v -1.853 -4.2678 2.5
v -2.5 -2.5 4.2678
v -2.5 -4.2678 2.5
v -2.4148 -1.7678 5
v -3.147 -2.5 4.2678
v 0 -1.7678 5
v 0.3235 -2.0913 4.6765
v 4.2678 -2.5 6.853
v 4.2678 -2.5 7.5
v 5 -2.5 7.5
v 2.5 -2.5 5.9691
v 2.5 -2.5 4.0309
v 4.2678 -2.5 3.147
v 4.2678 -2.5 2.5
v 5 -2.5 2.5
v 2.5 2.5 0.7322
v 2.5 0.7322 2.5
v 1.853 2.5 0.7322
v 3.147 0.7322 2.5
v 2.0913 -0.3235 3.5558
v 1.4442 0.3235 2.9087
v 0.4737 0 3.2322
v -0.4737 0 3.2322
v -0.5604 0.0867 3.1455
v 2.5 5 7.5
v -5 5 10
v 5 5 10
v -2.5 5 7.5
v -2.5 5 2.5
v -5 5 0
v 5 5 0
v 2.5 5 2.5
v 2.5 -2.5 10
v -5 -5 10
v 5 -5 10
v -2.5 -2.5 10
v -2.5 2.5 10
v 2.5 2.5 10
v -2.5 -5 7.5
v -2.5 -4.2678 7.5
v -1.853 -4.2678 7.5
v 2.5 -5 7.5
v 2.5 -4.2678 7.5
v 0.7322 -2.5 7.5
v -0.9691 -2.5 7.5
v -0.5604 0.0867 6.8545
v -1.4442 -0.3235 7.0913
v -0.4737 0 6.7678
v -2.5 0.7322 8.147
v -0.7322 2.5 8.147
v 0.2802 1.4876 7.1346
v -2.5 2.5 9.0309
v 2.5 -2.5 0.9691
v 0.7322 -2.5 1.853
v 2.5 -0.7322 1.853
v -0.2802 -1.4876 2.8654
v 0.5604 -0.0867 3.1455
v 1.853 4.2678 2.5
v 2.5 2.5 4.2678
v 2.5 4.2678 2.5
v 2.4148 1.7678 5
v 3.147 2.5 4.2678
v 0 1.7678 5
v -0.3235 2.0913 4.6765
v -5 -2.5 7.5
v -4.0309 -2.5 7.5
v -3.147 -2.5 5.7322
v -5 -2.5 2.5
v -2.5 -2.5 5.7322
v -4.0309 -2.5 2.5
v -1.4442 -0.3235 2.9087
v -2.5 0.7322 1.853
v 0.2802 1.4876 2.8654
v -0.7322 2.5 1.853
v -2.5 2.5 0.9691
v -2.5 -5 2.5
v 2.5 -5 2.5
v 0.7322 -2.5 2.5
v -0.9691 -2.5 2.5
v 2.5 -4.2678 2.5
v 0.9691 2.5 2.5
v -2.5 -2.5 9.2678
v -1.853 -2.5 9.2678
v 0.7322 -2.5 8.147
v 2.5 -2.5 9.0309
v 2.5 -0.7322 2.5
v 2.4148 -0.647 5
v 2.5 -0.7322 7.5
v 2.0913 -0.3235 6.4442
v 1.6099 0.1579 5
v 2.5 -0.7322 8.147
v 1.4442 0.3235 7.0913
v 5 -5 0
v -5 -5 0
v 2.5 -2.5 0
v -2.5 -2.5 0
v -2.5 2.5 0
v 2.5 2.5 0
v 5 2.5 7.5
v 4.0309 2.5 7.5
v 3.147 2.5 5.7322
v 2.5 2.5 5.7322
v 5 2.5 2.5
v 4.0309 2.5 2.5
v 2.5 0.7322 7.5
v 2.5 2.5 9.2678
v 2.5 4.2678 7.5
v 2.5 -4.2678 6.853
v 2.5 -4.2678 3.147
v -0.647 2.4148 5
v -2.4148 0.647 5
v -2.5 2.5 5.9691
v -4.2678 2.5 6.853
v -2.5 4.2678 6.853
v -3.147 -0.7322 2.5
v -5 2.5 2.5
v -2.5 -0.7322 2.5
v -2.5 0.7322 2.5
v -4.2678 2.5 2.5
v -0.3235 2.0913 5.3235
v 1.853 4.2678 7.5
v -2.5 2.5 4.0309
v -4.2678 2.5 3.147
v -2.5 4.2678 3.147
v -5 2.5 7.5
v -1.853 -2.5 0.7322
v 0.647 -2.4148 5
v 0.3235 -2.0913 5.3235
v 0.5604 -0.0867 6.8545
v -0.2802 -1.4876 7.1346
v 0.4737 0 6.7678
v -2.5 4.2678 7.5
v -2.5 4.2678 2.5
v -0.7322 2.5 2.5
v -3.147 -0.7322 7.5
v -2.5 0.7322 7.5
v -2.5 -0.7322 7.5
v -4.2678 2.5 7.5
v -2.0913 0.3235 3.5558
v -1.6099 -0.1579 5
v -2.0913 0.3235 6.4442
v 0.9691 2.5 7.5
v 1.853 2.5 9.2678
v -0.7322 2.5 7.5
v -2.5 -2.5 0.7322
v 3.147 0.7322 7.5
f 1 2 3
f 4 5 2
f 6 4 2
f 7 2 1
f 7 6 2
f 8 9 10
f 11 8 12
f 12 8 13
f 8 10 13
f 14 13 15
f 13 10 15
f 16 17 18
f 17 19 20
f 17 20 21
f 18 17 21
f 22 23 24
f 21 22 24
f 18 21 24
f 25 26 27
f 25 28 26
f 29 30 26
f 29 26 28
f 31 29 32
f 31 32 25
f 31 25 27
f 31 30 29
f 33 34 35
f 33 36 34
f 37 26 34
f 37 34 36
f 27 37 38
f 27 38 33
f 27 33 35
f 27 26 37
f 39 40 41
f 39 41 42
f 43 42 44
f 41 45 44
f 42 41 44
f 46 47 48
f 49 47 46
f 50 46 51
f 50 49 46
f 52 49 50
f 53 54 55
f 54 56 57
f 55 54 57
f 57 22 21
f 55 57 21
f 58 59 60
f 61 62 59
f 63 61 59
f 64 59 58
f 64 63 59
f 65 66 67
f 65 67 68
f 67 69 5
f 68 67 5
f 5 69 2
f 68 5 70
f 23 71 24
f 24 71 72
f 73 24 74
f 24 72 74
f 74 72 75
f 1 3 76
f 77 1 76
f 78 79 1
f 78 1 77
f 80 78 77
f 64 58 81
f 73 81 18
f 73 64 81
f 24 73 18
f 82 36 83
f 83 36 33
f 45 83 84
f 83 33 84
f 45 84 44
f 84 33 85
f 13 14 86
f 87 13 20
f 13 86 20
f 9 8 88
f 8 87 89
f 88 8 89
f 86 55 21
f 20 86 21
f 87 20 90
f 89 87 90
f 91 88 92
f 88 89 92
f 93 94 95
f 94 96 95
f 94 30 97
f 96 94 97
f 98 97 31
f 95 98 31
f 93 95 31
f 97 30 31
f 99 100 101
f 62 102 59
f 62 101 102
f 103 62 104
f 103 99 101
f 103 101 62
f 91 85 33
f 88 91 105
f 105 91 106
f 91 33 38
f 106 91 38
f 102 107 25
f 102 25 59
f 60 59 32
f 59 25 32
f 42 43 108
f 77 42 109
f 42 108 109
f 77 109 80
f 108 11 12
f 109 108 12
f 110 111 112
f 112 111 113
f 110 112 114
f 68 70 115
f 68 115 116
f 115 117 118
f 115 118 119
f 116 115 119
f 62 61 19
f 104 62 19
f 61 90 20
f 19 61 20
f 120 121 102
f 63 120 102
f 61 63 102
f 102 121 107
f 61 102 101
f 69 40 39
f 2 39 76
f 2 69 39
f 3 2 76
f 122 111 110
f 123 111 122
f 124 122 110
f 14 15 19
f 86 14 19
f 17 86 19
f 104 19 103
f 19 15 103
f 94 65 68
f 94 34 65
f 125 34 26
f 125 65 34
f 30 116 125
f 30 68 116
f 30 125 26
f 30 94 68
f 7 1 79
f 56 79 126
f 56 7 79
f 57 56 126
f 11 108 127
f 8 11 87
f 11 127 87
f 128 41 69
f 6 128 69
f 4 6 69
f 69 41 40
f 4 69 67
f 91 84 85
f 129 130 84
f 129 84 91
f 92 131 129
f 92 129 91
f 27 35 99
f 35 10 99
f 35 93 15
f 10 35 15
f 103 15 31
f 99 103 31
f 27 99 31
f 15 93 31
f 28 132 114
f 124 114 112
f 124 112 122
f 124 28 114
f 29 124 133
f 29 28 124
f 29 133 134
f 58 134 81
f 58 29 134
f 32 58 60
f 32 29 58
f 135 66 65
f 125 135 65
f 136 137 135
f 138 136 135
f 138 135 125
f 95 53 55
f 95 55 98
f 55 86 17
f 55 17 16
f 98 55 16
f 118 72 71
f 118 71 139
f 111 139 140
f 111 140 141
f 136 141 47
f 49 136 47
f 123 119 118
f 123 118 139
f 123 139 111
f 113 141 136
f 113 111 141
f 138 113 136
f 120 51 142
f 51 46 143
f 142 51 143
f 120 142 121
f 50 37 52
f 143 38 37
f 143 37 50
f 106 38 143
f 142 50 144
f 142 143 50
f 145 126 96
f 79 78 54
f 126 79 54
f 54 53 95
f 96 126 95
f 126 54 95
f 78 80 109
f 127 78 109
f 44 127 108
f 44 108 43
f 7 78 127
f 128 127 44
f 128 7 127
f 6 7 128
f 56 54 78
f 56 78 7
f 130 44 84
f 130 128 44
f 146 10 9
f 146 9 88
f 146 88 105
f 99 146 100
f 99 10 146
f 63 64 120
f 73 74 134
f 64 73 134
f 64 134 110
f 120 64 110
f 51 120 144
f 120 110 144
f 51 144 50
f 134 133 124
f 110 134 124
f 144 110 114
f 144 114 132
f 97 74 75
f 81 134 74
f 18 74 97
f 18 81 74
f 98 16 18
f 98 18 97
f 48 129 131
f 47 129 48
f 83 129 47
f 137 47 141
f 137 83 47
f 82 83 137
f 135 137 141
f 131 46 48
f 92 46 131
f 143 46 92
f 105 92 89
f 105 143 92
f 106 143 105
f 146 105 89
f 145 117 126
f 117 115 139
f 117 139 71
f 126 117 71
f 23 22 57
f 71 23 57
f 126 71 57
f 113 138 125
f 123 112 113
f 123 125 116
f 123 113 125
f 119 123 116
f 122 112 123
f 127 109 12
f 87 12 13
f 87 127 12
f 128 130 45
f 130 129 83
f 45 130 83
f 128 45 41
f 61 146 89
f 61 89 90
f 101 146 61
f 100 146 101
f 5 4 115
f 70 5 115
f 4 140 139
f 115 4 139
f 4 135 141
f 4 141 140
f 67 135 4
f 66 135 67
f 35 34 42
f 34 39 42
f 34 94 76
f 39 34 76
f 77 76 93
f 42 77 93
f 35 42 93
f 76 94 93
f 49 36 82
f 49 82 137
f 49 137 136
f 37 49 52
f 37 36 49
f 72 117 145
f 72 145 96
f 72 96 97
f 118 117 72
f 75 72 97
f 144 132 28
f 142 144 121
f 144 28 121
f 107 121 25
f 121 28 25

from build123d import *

# Parameters (mm, degrees)
SKETCH1_W           = 10
SKETCH1_H           = 10
BOSS_EXTRUDE1_DEPTH = 10
SKETCH2_W           = 5
SKETCH2_H           = 5
CUT_EXTRUDE1_DEPTH  = 13
SKETCH3_W           = 5
SKETCH3_H           = 5
CUT_EXTRUDE2_DEPTH  = 13
SKETCH4_W           = 5
SKETCH4_H           = 5
CUT_EXTRUDE3_DEPTH  = 13
SKETCH5_W           = 2.5
SKETCH5_H           = 2.5
BOSS_EXTRUDE3_DEPTH = 12
SKETCH7_W           = 2.5
SKETCH7_H           = 2.5
BOSS_EXTRUDE4_DEPTH = 12
SKETCH9_W           = 2.5
SKETCH9_H           = 2.5
BOSS_EXTRUDE5_DEPTH = 12
SKETCH11_W          = 2.5
SKETCH11_H          = 2.5
BOSS_EXTRUDE6_DEPTH = 12


with BuildPart() as part:
    # Sketch1 → Boss-Extrude1 (new body)
    with BuildSketch(Plane.XY):
        Rectangle(SKETCH1_W, SKETCH1_H)
    extrude(amount=BOSS_EXTRUDE1_DEPTH)

    # Sketch2 → Cut-Extrude1 (cut)
    with BuildSketch(Plane.XY.offset(10)):
        Rectangle(SKETCH2_W, SKETCH2_H)
    extrude(amount=-CUT_EXTRUDE1_DEPTH, mode=Mode.SUBTRACT)

    # Sketch3 → Cut-Extrude2 (cut)
    with BuildSketch(Plane(origin=(5, 0, 0), x_dir=(0, 0, -1), z_dir=(1, 0, 0))):
        with Locations((-5, 0)):
            Rectangle(SKETCH3_W, SKETCH3_H)
    extrude(amount=-CUT_EXTRUDE2_DEPTH, mode=Mode.SUBTRACT)

    # Sketch4 → Cut-Extrude3 (cut)
    with BuildSketch(Plane(origin=(0, 5, 0), x_dir=(1, 0, 0), z_dir=(0, 1, 0))):
        with Locations((0, -5)):
            Rectangle(SKETCH4_W, SKETCH4_H)
    extrude(amount=-CUT_EXTRUDE3_DEPTH, mode=Mode.SUBTRACT)

    # Sketch5 → Boss-Extrude3 (add)
    with BuildSketch(Plane(origin=(-5, -5, 5), x_dir=(-0.816496581, 0.40824829, -0.40824829), z_dir=(-0.577350269, -0.577350269, 0.577350269))):
        with Locations((-2.041241452, -3.535533906)):
            Rectangle(SKETCH5_W, SKETCH5_H)
    extrude(amount=-BOSS_EXTRUDE3_DEPTH)

    # Sketch7 → Boss-Extrude4 (add)
    with BuildSketch(Plane(origin=(-1.666666667, 1.666666667, -1.666666667), x_dir=(-0.40824829, 0.40824829, 0.816496581), z_dir=(-0.577350269, 0.577350269, -0.577350269))):
        with Locations((4.082482905, 0)):
            Rectangle(SKETCH7_W, SKETCH7_H)
    extrude(amount=-BOSS_EXTRUDE4_DEPTH)

    # Sketch9 → Boss-Extrude5 (add)
    with BuildSketch(Plane(origin=(-5, 5, 5), x_dir=(0.40824829, -0.40824829, 0.816496581), z_dir=(-0.577350269, 0.577350269, 0.577350269))):
        with Locations((4.082482905, 0)):
            Rectangle(SKETCH9_W, SKETCH9_H)
    extrude(amount=-BOSS_EXTRUDE5_DEPTH)

    # Sketch11 → Boss-Extrude6 (add)
    with BuildSketch(Plane(origin=(5, 5, 5), x_dir=(0.816496581, -0.40824829, -0.40824829), z_dir=(0.577350269, 0.577350269, 0.577350269))):
        with Locations((-2.041241452, -3.535533906)):
            Rectangle(SKETCH11_W, SKETCH11_H)
    extrude(amount=-BOSS_EXTRUDE6_DEPTH)


solid = part.part
